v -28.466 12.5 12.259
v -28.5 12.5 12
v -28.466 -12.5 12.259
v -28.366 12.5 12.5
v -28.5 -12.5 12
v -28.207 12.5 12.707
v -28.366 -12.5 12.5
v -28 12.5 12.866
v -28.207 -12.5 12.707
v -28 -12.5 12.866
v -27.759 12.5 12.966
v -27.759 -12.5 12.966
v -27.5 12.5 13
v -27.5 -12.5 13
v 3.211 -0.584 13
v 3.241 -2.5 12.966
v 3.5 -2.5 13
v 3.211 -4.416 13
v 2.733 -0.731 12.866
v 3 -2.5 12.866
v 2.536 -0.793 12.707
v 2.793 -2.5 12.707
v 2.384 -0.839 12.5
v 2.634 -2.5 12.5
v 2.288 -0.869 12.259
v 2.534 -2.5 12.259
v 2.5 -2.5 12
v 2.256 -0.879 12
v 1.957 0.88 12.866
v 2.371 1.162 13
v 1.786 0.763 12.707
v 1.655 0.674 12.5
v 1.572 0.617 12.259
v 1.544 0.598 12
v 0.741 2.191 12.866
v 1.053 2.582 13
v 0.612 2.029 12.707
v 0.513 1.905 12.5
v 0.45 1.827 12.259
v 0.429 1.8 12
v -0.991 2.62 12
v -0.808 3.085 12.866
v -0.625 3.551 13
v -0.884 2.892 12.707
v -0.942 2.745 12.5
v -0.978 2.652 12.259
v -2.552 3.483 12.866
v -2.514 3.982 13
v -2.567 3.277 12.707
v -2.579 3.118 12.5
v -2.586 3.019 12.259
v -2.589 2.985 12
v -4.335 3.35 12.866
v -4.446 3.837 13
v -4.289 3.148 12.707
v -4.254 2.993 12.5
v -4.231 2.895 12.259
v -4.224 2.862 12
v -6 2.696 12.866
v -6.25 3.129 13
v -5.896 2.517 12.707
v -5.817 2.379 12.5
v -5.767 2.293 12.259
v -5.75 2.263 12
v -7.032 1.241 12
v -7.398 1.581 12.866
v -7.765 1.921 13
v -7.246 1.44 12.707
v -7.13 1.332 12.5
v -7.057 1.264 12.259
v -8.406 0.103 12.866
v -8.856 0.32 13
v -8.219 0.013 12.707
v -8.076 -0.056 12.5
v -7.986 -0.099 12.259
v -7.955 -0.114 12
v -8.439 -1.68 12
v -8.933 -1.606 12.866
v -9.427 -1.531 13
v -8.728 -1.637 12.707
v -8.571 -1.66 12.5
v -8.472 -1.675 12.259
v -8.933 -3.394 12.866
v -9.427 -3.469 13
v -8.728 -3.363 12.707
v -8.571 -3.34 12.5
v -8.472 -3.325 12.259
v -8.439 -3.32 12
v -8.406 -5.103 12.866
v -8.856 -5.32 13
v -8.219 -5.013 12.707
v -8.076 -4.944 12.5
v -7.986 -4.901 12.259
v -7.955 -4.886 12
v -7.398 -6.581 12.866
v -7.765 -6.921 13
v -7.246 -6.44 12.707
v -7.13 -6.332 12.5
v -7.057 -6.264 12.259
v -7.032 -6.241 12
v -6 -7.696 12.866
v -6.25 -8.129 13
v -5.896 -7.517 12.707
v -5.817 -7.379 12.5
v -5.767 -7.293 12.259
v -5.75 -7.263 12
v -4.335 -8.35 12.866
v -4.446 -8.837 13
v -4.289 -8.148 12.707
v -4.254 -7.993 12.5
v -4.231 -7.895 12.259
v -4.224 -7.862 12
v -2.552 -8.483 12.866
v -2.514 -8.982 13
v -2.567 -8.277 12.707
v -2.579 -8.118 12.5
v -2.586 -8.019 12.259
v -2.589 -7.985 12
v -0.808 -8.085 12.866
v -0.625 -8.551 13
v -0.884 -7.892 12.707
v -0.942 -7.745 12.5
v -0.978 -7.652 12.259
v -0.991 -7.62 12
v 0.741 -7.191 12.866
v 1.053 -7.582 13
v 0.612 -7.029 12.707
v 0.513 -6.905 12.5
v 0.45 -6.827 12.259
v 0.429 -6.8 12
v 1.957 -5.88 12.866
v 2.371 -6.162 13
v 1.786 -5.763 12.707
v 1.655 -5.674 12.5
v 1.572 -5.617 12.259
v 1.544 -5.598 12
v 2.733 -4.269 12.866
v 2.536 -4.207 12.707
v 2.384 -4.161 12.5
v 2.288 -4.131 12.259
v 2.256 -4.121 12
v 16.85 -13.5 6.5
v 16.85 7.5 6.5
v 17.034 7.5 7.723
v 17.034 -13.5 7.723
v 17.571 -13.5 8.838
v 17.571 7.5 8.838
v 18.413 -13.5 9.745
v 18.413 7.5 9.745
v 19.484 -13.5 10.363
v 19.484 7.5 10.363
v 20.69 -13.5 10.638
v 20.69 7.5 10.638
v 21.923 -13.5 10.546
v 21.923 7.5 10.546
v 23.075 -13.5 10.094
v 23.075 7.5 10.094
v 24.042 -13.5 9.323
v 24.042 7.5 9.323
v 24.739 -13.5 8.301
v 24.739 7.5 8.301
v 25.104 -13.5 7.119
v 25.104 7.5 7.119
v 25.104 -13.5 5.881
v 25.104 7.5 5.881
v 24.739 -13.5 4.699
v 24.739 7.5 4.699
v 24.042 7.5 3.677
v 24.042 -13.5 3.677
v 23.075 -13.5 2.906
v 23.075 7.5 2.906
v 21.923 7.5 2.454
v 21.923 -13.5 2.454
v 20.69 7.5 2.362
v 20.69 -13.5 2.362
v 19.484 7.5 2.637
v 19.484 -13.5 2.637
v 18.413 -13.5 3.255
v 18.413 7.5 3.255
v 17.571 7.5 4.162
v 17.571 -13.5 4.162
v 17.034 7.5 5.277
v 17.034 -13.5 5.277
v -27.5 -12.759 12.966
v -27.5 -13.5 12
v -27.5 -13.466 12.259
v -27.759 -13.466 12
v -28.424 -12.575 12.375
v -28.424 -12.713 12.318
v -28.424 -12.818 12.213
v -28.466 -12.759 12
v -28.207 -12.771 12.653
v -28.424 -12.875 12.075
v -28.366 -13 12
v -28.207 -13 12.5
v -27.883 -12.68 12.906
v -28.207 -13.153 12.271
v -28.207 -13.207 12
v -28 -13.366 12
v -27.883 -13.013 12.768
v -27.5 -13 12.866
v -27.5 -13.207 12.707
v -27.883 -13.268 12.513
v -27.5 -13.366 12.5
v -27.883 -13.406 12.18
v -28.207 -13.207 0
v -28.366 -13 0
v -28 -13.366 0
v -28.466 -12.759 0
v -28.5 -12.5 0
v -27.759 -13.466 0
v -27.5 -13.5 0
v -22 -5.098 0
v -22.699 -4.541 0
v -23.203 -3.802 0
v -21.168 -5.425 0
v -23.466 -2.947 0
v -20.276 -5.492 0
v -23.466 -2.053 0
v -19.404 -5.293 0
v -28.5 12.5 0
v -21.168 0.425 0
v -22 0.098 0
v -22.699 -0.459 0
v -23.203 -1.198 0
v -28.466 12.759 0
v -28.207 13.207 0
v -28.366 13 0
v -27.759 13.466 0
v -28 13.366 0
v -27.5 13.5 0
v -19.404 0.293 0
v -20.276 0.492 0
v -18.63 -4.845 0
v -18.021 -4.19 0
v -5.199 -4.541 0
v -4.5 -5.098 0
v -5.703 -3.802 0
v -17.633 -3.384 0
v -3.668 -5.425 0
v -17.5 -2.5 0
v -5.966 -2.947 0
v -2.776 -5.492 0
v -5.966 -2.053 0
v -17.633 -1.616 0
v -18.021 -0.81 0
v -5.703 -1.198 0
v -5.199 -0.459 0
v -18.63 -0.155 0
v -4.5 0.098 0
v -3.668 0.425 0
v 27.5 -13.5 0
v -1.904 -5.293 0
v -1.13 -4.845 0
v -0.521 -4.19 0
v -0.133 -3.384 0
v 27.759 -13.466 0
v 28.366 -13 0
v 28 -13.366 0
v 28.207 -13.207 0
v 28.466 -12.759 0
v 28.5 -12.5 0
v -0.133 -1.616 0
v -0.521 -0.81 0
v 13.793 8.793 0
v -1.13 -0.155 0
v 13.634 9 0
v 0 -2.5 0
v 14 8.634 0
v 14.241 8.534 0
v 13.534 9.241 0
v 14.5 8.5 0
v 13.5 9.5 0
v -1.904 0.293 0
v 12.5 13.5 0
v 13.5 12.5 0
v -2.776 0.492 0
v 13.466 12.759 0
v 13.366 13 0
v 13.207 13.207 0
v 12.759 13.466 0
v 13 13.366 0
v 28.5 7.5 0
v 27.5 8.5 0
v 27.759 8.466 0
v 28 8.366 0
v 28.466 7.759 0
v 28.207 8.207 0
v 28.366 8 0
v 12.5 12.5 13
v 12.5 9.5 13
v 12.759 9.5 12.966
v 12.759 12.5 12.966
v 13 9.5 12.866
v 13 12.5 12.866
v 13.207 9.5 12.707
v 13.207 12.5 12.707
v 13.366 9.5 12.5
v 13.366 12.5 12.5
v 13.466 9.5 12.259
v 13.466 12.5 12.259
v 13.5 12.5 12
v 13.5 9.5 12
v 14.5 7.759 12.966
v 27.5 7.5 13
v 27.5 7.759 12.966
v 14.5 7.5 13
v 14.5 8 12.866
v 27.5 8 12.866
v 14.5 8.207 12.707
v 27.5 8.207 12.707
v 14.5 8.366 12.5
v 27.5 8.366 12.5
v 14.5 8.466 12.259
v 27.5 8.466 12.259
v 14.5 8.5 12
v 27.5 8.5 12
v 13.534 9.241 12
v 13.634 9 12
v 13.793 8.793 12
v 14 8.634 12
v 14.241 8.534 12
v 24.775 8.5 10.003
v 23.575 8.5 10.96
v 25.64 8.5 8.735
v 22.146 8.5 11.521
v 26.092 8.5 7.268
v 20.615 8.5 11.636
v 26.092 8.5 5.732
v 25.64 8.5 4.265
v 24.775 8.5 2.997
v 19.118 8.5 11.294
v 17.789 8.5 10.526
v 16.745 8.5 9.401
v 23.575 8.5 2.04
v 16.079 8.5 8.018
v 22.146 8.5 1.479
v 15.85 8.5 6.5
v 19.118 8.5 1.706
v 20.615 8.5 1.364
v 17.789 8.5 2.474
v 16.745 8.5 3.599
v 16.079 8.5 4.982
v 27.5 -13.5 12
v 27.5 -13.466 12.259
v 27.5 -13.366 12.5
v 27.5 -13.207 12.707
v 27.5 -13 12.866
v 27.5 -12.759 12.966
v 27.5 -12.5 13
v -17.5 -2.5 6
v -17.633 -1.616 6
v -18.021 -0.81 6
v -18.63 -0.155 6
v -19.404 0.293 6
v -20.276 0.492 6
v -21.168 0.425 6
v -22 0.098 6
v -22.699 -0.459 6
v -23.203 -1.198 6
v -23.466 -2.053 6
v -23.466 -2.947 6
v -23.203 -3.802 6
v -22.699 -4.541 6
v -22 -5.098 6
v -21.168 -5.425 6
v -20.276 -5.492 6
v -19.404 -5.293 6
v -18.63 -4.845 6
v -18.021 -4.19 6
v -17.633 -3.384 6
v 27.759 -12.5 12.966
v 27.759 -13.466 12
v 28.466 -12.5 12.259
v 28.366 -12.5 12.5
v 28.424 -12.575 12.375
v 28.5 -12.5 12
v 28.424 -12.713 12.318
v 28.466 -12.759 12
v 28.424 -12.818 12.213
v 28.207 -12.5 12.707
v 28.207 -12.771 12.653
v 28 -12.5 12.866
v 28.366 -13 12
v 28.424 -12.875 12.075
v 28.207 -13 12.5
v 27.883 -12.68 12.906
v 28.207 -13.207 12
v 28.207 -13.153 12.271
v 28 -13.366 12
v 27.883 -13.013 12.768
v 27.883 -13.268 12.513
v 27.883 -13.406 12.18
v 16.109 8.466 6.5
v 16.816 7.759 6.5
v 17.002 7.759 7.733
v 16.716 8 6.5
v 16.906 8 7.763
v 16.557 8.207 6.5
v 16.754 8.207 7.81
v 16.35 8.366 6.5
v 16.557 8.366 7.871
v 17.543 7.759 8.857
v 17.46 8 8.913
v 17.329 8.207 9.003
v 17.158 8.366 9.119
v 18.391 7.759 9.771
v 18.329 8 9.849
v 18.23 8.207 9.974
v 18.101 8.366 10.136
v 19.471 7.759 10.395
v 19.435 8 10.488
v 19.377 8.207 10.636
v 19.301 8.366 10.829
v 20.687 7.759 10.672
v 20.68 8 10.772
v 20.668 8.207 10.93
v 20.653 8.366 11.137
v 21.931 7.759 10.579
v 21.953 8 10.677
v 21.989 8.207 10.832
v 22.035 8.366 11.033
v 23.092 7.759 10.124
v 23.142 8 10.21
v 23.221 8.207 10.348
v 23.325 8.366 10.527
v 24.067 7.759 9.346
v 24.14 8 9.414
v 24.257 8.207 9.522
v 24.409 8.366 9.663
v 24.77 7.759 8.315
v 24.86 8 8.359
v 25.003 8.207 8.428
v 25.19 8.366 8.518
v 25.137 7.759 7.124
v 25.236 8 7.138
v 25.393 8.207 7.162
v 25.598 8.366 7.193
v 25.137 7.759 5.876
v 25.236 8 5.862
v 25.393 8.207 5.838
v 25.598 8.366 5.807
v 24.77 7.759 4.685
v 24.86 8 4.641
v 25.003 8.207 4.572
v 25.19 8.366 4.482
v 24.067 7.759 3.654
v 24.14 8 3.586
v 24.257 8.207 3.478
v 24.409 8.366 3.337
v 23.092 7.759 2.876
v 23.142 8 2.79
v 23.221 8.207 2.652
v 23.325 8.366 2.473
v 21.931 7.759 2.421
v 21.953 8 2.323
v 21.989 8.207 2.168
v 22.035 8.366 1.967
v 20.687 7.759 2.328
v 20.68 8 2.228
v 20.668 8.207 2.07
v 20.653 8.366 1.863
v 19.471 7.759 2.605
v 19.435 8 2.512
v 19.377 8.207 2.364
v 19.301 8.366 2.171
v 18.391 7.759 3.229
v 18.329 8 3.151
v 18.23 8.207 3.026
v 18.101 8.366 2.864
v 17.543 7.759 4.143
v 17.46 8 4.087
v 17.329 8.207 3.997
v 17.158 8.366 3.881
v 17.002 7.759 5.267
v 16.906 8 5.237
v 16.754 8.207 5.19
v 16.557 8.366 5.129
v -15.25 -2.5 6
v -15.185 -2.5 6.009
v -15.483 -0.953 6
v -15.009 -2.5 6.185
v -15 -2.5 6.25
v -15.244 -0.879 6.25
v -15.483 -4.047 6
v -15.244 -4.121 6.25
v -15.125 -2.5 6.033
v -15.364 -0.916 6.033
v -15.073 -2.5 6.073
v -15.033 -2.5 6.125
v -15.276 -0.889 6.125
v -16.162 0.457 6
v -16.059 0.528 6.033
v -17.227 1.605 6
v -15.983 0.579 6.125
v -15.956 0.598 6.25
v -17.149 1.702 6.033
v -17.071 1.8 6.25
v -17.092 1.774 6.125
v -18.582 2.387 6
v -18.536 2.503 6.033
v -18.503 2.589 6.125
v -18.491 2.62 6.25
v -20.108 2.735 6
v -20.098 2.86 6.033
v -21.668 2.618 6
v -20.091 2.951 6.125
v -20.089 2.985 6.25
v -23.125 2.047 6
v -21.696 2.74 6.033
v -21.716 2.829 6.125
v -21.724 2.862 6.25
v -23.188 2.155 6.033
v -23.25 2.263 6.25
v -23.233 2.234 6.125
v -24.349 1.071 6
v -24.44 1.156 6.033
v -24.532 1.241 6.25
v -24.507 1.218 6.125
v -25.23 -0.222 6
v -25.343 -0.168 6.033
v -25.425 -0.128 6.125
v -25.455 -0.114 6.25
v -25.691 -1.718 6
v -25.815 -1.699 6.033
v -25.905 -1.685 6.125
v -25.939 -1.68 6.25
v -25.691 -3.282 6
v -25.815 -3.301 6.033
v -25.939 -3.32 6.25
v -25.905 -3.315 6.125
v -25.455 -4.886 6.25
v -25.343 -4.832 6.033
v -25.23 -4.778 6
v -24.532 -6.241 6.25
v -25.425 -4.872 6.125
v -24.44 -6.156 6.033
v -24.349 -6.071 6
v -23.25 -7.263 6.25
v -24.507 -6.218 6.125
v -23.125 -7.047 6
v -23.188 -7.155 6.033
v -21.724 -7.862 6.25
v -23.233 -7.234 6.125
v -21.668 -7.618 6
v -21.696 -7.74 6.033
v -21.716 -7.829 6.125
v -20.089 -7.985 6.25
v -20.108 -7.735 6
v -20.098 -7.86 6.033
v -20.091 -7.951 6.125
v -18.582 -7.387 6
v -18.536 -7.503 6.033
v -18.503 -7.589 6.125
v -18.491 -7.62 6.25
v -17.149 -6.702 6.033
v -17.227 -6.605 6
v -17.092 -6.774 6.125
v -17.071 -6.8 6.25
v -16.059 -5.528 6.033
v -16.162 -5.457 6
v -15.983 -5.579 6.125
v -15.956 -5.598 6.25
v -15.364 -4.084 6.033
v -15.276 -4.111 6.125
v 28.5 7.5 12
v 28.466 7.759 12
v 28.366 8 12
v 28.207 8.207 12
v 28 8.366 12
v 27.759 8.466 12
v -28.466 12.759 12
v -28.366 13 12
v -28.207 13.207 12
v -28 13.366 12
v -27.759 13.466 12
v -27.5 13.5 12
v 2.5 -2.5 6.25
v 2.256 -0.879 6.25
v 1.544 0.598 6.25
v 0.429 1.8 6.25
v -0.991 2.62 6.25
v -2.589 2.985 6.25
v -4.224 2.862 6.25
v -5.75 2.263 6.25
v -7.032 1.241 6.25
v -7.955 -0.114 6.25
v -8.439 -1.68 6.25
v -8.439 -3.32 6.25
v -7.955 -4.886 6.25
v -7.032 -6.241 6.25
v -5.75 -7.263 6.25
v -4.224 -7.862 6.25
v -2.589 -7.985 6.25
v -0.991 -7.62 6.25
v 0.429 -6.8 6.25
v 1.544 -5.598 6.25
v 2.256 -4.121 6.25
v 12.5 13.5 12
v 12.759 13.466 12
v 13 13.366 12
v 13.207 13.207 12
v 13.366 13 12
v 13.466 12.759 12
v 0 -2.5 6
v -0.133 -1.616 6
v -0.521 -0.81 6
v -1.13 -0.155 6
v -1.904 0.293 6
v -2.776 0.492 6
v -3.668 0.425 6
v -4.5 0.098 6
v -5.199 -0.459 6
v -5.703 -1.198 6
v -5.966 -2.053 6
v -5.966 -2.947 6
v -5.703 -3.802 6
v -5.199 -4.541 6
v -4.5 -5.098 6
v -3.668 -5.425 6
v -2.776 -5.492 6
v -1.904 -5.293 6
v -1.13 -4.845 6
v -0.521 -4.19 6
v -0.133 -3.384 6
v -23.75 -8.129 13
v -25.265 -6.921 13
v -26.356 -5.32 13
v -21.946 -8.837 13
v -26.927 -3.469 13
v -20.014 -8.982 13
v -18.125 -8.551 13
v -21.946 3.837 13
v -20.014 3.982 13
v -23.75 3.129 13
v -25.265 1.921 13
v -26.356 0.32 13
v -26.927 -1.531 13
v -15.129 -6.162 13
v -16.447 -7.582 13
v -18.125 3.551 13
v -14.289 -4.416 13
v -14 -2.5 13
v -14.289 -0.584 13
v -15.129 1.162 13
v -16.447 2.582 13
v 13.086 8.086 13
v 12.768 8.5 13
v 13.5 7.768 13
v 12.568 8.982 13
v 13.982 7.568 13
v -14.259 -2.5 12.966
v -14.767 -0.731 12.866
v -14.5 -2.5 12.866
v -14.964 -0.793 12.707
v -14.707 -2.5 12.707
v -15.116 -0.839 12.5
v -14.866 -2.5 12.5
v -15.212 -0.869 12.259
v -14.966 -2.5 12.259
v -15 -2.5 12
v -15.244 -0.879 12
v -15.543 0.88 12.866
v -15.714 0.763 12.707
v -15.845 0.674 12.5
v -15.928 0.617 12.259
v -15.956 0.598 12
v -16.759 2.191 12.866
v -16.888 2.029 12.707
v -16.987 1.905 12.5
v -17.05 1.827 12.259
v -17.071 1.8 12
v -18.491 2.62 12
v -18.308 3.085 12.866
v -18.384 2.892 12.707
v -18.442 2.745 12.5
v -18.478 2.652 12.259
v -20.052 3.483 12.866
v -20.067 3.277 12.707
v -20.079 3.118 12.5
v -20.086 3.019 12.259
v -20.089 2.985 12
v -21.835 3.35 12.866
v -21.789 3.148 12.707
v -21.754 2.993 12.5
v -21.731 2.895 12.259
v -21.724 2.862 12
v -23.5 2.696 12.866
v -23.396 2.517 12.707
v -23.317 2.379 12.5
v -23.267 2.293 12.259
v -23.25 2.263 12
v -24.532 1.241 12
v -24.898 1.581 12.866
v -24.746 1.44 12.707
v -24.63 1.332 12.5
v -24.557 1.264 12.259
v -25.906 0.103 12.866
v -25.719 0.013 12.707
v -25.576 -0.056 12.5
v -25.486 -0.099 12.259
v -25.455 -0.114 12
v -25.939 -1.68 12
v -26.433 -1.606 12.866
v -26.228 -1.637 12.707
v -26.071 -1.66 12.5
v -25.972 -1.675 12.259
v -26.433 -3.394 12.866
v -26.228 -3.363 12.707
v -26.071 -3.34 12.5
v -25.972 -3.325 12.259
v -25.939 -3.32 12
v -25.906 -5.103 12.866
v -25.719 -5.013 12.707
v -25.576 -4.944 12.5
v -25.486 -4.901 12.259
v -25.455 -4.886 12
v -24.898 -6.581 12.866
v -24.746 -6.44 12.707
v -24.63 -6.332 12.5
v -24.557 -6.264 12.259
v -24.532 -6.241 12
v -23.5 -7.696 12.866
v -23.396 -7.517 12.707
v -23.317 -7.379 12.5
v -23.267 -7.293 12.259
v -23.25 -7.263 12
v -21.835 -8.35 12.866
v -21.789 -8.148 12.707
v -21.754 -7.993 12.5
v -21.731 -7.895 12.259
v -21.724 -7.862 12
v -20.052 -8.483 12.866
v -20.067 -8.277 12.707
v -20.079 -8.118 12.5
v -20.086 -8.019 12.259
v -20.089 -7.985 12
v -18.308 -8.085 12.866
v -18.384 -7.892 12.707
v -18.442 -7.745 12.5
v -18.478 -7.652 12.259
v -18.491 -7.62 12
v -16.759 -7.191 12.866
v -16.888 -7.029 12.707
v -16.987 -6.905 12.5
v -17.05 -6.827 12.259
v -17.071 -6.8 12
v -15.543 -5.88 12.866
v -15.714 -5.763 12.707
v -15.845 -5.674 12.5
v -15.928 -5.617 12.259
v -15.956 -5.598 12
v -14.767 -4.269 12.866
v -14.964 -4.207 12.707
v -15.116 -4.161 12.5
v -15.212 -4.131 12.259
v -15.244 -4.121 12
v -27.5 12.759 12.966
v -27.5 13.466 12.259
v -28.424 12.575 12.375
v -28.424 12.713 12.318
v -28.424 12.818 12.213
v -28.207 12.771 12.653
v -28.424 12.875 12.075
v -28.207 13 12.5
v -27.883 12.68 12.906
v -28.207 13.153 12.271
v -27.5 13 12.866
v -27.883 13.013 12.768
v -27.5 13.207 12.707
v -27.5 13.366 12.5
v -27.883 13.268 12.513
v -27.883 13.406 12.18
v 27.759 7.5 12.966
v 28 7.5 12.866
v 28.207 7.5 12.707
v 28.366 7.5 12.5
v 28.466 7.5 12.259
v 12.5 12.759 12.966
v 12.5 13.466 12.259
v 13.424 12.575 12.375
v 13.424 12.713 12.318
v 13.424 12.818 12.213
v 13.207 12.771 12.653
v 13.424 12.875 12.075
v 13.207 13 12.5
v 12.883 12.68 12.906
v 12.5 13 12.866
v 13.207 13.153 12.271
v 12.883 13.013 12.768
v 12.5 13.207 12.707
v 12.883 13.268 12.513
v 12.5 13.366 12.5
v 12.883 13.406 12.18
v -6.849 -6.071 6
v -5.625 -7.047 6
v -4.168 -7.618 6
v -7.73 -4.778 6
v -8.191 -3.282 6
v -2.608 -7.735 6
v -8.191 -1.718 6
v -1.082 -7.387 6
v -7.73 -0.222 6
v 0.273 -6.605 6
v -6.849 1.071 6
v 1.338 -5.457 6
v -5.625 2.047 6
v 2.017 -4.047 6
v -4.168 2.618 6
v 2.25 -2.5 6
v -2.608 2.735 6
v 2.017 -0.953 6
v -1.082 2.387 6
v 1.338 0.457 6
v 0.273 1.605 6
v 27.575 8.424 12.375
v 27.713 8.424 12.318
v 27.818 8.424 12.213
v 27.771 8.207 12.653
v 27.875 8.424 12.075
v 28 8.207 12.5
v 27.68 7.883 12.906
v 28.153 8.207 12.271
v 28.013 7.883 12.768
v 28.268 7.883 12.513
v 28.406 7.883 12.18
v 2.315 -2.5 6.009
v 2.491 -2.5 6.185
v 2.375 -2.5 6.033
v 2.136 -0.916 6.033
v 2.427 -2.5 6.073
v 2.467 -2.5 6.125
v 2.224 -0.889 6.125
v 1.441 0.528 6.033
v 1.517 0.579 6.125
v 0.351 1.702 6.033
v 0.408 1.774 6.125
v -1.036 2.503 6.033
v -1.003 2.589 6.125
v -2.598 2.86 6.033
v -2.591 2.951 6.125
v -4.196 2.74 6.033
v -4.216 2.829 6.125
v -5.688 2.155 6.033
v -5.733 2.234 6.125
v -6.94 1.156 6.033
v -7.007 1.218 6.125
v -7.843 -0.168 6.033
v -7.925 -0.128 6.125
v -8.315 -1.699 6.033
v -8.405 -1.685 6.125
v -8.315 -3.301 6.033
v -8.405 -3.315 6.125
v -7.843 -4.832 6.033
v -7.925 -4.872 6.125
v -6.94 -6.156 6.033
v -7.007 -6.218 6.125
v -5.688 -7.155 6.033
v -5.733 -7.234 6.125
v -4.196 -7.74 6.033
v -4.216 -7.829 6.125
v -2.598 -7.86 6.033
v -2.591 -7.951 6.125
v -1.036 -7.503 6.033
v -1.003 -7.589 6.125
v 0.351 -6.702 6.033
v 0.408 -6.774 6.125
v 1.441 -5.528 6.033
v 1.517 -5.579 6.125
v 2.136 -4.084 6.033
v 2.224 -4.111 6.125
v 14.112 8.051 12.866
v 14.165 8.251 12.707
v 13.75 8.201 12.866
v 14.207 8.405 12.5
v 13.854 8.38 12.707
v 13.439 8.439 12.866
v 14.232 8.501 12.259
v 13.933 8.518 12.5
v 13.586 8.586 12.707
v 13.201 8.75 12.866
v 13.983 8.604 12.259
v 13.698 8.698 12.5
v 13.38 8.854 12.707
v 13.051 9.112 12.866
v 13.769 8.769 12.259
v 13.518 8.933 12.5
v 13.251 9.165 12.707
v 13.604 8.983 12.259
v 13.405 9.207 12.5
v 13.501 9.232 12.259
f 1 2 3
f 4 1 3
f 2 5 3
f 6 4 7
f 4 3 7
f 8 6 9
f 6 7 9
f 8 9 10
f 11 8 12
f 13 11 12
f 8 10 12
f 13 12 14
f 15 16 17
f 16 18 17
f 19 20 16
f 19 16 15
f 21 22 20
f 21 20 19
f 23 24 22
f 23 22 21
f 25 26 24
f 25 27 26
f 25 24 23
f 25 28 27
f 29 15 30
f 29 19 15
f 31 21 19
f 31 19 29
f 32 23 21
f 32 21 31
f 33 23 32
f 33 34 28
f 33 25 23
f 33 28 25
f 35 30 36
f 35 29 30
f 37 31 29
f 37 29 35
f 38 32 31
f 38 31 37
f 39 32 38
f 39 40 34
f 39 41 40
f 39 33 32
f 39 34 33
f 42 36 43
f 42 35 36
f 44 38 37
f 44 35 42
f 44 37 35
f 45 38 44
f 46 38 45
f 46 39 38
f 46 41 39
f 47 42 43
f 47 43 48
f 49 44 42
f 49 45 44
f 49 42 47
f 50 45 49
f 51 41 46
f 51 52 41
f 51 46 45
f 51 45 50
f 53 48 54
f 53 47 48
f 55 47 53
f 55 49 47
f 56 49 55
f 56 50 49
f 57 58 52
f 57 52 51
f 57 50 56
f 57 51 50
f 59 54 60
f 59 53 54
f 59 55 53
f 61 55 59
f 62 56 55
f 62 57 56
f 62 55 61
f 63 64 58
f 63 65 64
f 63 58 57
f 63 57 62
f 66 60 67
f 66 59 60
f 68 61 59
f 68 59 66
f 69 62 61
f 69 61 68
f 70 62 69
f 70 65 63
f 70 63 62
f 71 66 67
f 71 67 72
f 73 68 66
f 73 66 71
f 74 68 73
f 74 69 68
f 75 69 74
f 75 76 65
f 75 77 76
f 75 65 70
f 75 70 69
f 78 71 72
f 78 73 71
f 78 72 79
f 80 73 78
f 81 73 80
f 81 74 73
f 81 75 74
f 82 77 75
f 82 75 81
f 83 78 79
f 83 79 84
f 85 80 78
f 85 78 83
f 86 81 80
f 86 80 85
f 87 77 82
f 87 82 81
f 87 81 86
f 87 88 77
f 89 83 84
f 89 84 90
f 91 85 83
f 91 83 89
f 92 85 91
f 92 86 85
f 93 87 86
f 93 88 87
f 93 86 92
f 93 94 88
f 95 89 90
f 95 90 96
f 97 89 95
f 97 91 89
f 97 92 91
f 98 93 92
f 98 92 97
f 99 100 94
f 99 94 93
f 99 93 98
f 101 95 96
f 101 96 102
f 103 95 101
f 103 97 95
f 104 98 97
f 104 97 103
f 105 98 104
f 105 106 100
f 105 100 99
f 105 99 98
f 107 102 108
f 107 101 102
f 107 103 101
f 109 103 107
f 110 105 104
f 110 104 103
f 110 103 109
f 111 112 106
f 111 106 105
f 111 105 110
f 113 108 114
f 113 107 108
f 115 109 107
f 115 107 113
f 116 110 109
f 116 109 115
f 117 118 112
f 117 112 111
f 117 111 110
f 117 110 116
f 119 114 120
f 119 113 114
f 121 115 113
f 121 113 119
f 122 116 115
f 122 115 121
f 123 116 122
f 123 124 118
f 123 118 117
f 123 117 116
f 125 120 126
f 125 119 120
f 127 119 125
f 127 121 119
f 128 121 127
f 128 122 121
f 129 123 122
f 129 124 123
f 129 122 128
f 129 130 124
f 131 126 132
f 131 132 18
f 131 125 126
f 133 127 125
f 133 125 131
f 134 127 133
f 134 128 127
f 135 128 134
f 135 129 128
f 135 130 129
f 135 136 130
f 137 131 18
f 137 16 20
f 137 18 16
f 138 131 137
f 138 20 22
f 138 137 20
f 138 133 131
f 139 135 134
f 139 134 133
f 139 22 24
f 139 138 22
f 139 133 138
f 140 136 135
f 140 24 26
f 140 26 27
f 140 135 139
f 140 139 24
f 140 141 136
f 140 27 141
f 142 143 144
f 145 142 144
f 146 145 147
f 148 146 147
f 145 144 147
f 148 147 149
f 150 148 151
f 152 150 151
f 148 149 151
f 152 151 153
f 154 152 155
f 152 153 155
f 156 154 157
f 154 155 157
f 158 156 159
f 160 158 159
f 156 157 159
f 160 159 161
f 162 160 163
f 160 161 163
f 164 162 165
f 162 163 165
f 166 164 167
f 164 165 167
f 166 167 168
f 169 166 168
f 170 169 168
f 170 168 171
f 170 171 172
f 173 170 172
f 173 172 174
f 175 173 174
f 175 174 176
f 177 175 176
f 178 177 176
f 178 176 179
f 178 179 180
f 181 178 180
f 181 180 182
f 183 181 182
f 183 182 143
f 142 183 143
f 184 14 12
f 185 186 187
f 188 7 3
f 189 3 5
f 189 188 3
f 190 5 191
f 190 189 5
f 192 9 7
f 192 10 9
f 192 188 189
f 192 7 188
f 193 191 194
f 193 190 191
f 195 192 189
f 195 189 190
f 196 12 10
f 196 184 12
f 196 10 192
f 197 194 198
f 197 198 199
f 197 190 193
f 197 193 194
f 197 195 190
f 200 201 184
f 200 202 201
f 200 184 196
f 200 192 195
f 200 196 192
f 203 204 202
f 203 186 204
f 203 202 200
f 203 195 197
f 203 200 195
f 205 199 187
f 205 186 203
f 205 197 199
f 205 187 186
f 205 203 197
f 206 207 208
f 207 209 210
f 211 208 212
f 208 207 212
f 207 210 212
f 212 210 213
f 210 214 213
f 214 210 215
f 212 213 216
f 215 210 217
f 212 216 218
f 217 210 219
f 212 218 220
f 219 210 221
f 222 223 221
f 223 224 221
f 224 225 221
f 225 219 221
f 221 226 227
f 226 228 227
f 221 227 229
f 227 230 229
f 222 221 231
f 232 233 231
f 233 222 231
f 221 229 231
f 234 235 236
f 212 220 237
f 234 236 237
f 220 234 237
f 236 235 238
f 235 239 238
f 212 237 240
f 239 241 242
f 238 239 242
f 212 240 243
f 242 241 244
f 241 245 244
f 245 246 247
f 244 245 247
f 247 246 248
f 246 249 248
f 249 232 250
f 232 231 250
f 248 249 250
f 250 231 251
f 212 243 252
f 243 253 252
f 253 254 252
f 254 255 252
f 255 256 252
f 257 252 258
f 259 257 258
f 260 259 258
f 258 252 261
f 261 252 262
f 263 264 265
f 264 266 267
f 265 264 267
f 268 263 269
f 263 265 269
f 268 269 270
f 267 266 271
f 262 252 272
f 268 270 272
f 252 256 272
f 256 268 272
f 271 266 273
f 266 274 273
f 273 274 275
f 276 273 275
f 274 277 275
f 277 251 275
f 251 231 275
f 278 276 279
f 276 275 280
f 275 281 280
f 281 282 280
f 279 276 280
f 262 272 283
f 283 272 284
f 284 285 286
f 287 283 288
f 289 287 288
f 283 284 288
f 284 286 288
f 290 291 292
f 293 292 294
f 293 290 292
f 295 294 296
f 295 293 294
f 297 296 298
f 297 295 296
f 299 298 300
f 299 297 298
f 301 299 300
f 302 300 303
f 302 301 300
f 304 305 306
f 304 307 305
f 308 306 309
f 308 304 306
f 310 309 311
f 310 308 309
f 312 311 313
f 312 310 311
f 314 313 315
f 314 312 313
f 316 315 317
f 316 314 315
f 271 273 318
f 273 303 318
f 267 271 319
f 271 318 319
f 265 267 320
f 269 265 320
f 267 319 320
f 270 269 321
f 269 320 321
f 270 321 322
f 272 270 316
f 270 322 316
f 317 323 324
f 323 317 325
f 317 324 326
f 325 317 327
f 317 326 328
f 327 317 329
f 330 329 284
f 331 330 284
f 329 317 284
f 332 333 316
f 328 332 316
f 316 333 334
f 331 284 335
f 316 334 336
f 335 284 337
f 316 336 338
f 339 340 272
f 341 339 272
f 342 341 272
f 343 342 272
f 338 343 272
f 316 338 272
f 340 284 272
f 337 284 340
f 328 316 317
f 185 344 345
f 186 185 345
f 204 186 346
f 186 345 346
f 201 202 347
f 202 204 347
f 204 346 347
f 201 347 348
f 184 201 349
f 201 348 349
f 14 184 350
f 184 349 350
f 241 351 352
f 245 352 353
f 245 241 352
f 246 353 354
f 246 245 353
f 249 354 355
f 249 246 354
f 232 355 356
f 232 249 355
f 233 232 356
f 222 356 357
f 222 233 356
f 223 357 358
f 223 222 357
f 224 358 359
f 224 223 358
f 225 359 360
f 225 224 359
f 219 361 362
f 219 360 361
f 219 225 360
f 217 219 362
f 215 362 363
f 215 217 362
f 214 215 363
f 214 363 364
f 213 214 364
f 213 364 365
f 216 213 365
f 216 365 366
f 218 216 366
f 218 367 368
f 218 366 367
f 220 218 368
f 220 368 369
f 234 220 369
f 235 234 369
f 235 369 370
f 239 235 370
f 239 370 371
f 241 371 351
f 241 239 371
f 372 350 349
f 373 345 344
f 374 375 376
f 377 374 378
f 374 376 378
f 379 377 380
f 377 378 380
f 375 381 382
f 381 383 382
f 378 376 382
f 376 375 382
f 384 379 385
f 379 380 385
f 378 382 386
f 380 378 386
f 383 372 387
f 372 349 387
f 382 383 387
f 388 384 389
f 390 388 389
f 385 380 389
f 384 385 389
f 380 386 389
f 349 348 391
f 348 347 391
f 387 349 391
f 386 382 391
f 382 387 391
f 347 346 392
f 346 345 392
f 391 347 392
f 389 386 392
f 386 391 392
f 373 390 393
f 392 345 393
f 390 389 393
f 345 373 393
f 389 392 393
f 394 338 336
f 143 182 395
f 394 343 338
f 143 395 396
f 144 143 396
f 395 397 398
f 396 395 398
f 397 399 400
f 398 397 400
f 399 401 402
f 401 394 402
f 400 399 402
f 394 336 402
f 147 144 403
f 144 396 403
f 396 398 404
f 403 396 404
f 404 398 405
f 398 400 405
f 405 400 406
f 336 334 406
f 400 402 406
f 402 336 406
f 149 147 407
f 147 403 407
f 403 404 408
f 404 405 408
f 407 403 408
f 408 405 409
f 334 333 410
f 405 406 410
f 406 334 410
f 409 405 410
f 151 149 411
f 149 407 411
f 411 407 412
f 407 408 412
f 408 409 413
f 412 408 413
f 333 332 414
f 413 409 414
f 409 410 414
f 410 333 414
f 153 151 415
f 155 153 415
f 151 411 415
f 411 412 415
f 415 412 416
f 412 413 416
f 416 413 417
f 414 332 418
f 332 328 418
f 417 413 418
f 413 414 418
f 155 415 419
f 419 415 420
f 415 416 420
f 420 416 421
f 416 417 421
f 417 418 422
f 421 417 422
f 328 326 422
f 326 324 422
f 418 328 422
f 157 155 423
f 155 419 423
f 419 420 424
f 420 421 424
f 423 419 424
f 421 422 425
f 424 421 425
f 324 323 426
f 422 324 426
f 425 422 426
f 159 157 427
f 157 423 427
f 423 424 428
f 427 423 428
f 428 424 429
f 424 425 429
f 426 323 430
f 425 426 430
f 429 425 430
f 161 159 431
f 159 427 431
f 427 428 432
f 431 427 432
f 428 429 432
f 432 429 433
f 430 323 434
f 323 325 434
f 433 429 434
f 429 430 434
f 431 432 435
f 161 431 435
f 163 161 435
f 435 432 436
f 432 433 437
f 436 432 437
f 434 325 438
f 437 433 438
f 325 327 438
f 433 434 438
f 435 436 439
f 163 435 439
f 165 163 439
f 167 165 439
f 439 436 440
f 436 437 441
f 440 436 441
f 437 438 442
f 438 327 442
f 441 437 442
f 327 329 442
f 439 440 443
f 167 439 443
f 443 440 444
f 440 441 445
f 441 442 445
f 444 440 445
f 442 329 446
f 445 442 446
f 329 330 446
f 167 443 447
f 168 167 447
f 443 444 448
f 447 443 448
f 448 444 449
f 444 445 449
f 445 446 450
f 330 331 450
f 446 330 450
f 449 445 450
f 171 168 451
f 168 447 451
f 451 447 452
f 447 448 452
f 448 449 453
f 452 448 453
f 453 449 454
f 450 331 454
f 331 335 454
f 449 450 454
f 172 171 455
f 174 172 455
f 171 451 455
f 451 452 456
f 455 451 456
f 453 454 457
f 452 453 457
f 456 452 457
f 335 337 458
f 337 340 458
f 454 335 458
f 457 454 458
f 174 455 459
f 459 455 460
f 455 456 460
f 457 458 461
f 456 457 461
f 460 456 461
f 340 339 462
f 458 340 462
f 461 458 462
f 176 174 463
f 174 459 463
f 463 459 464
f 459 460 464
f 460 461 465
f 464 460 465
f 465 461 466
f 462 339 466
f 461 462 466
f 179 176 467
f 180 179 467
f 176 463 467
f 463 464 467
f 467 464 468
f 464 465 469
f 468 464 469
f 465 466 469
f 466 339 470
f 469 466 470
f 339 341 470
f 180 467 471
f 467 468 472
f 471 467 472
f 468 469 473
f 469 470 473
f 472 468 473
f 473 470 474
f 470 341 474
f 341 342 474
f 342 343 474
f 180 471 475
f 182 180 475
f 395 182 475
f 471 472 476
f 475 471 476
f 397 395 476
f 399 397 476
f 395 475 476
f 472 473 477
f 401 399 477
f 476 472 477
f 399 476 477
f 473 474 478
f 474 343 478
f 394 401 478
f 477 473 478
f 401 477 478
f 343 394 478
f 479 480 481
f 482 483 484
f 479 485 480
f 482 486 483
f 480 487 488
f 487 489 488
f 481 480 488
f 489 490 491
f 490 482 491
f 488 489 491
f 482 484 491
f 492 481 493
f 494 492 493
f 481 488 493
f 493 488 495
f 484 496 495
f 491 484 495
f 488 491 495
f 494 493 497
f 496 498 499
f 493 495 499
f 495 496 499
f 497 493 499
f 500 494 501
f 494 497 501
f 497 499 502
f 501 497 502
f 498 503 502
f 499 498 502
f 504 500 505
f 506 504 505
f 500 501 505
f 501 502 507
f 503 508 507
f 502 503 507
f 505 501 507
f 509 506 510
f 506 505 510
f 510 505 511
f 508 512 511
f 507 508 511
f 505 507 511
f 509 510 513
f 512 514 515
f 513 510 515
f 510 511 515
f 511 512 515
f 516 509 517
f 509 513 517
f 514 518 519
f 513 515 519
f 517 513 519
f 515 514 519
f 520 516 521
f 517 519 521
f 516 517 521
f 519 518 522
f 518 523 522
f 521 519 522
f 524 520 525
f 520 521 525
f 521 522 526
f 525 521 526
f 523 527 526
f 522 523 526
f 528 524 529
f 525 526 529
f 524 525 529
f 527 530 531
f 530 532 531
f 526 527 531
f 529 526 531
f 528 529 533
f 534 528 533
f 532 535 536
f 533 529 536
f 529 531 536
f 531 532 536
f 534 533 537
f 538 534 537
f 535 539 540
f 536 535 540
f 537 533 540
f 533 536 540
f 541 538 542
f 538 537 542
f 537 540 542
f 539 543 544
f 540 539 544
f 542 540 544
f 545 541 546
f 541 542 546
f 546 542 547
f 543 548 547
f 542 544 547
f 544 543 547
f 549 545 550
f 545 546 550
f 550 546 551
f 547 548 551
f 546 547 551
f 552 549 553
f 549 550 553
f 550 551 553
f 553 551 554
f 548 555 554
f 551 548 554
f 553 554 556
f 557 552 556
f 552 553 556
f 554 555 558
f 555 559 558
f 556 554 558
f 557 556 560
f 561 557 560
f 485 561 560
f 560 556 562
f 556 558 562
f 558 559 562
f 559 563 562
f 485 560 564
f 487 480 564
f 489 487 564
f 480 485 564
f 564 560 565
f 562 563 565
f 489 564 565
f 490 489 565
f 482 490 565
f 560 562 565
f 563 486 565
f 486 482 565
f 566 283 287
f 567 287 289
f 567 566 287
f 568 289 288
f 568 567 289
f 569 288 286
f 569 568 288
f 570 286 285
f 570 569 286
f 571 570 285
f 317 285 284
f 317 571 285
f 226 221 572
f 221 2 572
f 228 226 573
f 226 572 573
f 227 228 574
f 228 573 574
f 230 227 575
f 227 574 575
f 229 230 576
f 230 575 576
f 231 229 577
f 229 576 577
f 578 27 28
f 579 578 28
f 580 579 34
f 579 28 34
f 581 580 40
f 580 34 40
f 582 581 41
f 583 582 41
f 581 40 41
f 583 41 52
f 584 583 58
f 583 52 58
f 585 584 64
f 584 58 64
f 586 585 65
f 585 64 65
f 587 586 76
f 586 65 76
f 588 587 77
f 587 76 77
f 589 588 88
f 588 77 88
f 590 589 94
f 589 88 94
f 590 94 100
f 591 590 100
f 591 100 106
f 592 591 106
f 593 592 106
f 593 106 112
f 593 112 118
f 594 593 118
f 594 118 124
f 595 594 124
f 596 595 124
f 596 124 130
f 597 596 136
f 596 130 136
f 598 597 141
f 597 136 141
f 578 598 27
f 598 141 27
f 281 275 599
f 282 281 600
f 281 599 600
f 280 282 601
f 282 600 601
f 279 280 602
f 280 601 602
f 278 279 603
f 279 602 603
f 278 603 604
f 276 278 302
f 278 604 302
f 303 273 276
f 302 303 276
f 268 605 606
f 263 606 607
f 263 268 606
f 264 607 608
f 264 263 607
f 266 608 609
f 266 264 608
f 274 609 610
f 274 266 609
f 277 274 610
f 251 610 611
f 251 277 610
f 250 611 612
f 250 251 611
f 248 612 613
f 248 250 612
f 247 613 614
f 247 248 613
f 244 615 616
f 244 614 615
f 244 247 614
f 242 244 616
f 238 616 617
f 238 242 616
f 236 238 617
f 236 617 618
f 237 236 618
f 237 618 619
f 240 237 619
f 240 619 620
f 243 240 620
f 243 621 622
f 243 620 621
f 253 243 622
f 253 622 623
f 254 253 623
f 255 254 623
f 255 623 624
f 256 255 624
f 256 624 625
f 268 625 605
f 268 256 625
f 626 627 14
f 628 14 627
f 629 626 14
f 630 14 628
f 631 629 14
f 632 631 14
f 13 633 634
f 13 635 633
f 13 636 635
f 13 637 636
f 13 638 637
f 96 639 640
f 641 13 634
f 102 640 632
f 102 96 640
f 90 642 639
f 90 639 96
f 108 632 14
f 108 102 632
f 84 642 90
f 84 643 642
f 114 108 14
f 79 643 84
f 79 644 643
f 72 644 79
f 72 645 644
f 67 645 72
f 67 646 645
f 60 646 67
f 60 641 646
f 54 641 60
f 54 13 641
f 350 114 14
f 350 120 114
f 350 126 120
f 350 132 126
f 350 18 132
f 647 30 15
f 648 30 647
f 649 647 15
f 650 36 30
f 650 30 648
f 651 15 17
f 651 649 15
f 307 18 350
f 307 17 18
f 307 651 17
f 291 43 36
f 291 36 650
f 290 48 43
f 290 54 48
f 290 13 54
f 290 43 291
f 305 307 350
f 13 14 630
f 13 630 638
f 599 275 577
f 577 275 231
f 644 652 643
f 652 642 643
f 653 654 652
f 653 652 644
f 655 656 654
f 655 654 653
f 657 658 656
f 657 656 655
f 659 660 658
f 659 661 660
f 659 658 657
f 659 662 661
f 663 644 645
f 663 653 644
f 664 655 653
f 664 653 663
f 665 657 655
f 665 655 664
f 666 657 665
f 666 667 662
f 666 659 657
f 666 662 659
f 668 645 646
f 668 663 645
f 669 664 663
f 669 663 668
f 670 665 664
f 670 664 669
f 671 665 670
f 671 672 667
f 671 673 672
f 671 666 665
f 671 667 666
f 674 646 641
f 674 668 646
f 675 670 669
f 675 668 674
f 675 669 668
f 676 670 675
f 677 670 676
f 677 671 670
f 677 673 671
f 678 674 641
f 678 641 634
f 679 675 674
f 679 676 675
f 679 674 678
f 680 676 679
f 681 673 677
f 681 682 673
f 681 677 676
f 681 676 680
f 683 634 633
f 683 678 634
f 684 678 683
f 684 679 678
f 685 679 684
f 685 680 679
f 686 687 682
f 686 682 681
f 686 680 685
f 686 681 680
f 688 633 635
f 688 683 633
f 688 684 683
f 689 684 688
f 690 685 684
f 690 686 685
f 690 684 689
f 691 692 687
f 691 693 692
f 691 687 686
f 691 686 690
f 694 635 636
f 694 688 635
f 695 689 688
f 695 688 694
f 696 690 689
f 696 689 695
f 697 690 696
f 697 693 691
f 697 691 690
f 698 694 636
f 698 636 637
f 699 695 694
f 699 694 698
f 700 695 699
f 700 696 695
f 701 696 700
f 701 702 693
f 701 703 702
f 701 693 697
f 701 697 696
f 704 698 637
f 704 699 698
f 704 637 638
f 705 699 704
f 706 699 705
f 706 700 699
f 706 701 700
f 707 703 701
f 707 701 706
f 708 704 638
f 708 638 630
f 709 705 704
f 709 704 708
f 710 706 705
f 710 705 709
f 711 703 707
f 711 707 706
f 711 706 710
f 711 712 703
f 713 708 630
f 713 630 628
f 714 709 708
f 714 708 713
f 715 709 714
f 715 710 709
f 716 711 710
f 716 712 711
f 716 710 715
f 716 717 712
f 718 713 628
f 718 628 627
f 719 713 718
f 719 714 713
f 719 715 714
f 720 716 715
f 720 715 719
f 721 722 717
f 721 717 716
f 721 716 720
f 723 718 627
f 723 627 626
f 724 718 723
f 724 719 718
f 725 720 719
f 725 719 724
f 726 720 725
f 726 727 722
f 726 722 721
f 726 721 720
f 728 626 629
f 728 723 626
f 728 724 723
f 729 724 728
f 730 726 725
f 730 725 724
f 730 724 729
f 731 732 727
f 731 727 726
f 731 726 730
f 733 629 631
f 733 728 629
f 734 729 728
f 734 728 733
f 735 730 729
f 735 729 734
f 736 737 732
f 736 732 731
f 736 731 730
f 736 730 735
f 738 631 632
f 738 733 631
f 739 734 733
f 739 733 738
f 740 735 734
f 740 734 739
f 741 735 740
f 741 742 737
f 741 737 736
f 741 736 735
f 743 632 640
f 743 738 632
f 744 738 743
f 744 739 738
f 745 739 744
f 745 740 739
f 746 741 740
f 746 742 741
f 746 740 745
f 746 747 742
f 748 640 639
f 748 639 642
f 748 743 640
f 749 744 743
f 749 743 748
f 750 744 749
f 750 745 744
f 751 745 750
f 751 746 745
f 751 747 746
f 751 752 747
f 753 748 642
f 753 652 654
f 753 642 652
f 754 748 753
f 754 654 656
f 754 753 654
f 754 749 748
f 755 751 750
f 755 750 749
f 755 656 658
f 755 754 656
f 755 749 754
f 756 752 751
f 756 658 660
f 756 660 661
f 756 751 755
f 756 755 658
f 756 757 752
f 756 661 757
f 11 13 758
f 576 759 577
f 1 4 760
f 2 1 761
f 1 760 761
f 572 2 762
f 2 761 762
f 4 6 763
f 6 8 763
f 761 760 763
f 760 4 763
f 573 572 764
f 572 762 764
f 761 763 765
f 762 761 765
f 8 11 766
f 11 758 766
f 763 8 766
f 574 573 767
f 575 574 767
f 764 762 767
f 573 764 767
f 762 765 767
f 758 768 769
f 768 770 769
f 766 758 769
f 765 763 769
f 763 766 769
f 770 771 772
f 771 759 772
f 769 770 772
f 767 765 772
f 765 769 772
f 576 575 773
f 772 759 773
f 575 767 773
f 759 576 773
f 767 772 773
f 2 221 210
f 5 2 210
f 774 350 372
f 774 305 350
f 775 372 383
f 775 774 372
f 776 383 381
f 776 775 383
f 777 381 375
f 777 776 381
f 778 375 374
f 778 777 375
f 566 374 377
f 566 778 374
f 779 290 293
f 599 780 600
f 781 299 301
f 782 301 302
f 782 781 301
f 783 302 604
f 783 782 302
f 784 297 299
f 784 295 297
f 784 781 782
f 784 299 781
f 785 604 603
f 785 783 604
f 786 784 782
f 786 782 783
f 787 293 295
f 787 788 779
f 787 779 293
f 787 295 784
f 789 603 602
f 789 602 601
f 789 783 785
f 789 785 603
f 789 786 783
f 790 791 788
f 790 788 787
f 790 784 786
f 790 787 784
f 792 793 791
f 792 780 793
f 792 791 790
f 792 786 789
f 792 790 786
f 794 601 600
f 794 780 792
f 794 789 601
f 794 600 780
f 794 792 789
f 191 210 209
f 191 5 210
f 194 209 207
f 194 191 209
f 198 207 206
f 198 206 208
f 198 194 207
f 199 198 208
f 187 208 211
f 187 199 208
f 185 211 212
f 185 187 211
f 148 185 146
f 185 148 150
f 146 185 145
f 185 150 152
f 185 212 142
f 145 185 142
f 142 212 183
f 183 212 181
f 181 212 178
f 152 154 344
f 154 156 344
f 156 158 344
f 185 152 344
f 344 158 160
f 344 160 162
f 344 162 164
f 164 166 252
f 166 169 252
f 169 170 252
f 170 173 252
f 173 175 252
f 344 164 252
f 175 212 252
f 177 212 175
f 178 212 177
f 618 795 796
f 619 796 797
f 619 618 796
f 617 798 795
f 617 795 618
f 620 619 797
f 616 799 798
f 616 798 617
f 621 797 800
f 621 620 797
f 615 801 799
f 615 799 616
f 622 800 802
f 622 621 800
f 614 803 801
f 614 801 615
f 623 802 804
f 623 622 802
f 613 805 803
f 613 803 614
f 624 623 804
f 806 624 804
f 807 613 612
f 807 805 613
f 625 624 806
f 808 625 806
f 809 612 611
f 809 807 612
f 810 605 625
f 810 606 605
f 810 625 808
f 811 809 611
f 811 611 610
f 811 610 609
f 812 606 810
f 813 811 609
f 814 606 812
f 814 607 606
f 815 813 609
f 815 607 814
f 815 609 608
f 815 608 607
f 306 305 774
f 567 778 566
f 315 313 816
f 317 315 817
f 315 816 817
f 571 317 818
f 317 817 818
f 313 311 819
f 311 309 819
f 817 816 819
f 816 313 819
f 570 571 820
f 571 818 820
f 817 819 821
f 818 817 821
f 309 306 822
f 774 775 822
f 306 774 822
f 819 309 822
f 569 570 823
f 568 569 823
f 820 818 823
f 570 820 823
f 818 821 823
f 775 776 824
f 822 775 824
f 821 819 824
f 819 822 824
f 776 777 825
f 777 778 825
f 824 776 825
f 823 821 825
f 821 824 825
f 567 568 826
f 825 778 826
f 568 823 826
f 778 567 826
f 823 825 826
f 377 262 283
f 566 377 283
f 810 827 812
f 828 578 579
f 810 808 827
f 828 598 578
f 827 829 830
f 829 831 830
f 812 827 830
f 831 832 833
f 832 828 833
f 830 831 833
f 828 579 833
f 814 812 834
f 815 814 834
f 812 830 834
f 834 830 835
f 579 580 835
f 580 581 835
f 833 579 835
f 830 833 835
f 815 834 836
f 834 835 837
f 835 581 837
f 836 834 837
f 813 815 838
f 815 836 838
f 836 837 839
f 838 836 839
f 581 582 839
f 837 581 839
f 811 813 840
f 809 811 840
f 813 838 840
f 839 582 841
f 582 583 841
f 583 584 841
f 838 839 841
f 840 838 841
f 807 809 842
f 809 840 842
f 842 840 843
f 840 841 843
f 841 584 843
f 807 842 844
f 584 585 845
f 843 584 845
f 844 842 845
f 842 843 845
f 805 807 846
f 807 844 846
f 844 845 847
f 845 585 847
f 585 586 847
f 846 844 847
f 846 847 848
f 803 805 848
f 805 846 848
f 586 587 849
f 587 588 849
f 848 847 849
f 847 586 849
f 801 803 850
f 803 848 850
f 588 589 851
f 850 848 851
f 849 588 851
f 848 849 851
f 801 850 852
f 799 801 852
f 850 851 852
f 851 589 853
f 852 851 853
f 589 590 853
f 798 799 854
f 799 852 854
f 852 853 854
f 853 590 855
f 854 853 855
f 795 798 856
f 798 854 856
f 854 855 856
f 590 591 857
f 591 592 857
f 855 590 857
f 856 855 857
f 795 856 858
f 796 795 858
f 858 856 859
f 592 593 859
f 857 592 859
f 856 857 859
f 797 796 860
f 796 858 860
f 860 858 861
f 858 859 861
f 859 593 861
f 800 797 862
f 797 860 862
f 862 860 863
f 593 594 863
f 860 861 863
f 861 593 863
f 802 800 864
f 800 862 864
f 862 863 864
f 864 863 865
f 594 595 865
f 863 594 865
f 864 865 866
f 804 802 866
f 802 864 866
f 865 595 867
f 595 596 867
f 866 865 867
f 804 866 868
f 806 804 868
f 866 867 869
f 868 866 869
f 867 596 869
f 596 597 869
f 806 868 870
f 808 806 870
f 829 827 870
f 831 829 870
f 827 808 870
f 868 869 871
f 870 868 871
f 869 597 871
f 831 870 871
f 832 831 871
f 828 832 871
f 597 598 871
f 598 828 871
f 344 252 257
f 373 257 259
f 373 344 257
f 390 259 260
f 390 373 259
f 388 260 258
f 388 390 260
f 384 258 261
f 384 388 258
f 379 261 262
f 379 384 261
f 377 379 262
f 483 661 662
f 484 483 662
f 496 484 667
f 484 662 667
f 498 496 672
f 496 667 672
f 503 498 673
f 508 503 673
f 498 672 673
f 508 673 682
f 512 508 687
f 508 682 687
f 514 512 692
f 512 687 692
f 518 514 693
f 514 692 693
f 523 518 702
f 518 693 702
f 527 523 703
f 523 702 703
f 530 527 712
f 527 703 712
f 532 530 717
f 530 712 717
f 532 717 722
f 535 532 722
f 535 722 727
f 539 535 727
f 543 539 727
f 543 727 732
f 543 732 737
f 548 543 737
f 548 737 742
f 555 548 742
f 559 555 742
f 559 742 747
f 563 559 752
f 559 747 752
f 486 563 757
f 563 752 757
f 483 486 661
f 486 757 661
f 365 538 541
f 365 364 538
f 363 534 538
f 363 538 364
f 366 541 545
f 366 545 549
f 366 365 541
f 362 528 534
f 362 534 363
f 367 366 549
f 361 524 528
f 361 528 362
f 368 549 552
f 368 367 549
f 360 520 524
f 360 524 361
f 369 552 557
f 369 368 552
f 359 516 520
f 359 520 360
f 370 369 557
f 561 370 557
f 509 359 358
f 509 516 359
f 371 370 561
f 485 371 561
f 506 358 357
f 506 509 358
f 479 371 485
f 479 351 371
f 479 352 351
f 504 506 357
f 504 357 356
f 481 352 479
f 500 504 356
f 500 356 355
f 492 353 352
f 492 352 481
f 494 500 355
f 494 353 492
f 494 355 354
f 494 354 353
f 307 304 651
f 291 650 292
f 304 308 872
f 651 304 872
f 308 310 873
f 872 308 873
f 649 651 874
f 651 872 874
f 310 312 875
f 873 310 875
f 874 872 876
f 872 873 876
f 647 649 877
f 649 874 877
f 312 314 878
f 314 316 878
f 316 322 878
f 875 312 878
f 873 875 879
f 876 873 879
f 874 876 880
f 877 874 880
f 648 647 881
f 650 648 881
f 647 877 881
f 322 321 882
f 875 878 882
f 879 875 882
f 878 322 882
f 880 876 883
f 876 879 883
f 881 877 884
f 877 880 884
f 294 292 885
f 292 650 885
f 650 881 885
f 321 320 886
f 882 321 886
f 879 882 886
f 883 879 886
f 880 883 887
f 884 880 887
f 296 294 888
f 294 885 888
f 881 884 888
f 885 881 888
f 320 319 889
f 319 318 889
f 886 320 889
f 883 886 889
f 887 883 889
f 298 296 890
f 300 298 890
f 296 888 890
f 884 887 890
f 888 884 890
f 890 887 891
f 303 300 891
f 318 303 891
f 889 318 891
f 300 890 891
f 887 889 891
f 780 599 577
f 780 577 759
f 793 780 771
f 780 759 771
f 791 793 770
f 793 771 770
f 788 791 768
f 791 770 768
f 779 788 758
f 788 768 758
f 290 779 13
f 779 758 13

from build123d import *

# Parameters (mm, degrees)
F0_R     = 3
F1_DEPTH = 13
F2_R     = 4.15
F3_DEPTH = 22.001
F4_R     = 5.5
F5_DEPTH = 7
F6_R     = 1
F7_R     = 0.25


with BuildPart() as f1:
    # F0 (on Top) → F1 (new body)
    with BuildSketch(Plane.XY):
        Polygon((-28.5, 13.5), (-28.5, -13.5), (28.5, -13.5), (28.5, 8.5), (13.5, 8.5), (13.5, 13.5), align=None)
        with Locations((-20.5, -2.5)):
            Circle(F0_R, mode=Mode.SUBTRACT)
        with Locations((-3, -2.5)):
            Circle(F0_R, mode=Mode.SUBTRACT)
    extrude(amount=F1_DEPTH)

    # F2 (on face) → F3 (cut, through all)
    with BuildSketch(Plane(origin=(0, 8.5, 0), x_dir=(-1, 0, 0), z_dir=(0, 1, 0))):
        with Locations((-21, 6.5)):
            Circle(F2_R)
    extrude(amount=-F3_DEPTH, mode=Mode.SUBTRACT)

    # F4 (on face) → F5 (cut)
    with BuildSketch(Plane.XY.offset(13)):
        with Locations((-20.5, -2.5)):
            Circle(F4_R)
        with Locations((-3, -2.5)):
            Circle(F4_R)
    extrude(amount=-F5_DEPTH, mode=Mode.SUBTRACT)

    # F6
    f6_edges = [f1.edges().sort_by_distance(p)[0] for p in [
        (0, -13.5, 13),
        (28.5, -2.5, 13),
        (-7.5, 13.5, 13),
        (21, 8.5, 13),
        (13.5, 11, 13),
        (-28.5, 0, 13),
        (-28.5, -13.5, 6.5),
        (28.5, -13.5, 6.5),
        (28.5, 8.5, 6.5),
        (13.5, 8.5, 6.5),
        (13.5, 13.5, 6.5),
        (-28.5, 13.5, 6.5),
        (25.15, 8.5, 6.5),
        (-8.5, -2.5, 13),
        (-26, -2.5, 13),
    ]]
    fillet(f6_edges, radius=F6_R)

    # F7
    f7_edges = [f1.edges().sort_by_distance(p)[0] for p in [
        (-8.5, -2.5, 6),
        (-26, -2.5, 6),
    ]]
    fillet(f7_edges, radius=F7_R)


solid = f1.part
